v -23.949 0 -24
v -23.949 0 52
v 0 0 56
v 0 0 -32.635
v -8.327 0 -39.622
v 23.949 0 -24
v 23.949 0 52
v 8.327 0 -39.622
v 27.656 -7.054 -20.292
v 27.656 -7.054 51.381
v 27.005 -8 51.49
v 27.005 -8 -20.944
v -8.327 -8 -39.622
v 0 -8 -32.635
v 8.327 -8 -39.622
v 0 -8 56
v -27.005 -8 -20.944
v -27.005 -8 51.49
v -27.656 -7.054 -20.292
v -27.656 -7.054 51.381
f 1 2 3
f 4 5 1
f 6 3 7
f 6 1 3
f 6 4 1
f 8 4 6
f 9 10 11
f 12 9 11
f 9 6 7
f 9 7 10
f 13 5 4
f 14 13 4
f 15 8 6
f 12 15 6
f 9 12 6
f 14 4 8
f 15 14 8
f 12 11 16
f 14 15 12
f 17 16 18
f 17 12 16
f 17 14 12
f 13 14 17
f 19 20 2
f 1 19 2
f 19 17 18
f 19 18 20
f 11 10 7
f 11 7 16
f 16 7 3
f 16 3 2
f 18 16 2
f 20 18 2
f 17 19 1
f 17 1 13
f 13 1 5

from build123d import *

# Parameters (mm, degrees)
BOSS_EXTRUDE1_START = -39.622072
BOSS_EXTRUDE1_DEPTH = 95.622072
SKETCH3_OUTSIDE_W   = 79.464
SKETCH3_OUTSIDE_H   = 119.774
CUT_EXTRUDE1_DEPTH  = 63.967259819


with BuildPart() as part:
    # Sketch2 → Boss-Extrude1 (new body)
    with BuildSketch(Plane.XY.offset(BOSS_EXTRUDE1_START)):
        Polygon((23.948813845, 0), (27.656388216, -7.053975388), (27.005057694, -8), (-27.005057694, -8), (-27.656388216, -7.053975388), (-23.948813845, 0), align=None)
    extrude(amount=BOSS_EXTRUDE1_DEPTH)

    # Sketch3 outside → Cut-Extrude1 (cut, through all)
    with BuildSketch(Plane(origin=(0, 0, 0), x_dir=(1, 0, 0), z_dir=(0, 1, 0))):
        with Locations((0, -8.189)):
            Rectangle(SKETCH3_OUTSIDE_W, SKETCH3_OUTSIDE_H)
        Polygon((0, 32.635105346), (8.326742195, 39.622071651), (27.656388216, 20.292425629), (27.656388216, -51.380750229), (0, -56), (-27.656388216, -51.380750229), (-27.656388216, 20.292425629), (-8.326742195, 39.622071651), align=None, mode=Mode.SUBTRACT)
    extrude(amount=-CUT_EXTRUDE1_DEPTH, mode=Mode.SUBTRACT)


solid = part.part
